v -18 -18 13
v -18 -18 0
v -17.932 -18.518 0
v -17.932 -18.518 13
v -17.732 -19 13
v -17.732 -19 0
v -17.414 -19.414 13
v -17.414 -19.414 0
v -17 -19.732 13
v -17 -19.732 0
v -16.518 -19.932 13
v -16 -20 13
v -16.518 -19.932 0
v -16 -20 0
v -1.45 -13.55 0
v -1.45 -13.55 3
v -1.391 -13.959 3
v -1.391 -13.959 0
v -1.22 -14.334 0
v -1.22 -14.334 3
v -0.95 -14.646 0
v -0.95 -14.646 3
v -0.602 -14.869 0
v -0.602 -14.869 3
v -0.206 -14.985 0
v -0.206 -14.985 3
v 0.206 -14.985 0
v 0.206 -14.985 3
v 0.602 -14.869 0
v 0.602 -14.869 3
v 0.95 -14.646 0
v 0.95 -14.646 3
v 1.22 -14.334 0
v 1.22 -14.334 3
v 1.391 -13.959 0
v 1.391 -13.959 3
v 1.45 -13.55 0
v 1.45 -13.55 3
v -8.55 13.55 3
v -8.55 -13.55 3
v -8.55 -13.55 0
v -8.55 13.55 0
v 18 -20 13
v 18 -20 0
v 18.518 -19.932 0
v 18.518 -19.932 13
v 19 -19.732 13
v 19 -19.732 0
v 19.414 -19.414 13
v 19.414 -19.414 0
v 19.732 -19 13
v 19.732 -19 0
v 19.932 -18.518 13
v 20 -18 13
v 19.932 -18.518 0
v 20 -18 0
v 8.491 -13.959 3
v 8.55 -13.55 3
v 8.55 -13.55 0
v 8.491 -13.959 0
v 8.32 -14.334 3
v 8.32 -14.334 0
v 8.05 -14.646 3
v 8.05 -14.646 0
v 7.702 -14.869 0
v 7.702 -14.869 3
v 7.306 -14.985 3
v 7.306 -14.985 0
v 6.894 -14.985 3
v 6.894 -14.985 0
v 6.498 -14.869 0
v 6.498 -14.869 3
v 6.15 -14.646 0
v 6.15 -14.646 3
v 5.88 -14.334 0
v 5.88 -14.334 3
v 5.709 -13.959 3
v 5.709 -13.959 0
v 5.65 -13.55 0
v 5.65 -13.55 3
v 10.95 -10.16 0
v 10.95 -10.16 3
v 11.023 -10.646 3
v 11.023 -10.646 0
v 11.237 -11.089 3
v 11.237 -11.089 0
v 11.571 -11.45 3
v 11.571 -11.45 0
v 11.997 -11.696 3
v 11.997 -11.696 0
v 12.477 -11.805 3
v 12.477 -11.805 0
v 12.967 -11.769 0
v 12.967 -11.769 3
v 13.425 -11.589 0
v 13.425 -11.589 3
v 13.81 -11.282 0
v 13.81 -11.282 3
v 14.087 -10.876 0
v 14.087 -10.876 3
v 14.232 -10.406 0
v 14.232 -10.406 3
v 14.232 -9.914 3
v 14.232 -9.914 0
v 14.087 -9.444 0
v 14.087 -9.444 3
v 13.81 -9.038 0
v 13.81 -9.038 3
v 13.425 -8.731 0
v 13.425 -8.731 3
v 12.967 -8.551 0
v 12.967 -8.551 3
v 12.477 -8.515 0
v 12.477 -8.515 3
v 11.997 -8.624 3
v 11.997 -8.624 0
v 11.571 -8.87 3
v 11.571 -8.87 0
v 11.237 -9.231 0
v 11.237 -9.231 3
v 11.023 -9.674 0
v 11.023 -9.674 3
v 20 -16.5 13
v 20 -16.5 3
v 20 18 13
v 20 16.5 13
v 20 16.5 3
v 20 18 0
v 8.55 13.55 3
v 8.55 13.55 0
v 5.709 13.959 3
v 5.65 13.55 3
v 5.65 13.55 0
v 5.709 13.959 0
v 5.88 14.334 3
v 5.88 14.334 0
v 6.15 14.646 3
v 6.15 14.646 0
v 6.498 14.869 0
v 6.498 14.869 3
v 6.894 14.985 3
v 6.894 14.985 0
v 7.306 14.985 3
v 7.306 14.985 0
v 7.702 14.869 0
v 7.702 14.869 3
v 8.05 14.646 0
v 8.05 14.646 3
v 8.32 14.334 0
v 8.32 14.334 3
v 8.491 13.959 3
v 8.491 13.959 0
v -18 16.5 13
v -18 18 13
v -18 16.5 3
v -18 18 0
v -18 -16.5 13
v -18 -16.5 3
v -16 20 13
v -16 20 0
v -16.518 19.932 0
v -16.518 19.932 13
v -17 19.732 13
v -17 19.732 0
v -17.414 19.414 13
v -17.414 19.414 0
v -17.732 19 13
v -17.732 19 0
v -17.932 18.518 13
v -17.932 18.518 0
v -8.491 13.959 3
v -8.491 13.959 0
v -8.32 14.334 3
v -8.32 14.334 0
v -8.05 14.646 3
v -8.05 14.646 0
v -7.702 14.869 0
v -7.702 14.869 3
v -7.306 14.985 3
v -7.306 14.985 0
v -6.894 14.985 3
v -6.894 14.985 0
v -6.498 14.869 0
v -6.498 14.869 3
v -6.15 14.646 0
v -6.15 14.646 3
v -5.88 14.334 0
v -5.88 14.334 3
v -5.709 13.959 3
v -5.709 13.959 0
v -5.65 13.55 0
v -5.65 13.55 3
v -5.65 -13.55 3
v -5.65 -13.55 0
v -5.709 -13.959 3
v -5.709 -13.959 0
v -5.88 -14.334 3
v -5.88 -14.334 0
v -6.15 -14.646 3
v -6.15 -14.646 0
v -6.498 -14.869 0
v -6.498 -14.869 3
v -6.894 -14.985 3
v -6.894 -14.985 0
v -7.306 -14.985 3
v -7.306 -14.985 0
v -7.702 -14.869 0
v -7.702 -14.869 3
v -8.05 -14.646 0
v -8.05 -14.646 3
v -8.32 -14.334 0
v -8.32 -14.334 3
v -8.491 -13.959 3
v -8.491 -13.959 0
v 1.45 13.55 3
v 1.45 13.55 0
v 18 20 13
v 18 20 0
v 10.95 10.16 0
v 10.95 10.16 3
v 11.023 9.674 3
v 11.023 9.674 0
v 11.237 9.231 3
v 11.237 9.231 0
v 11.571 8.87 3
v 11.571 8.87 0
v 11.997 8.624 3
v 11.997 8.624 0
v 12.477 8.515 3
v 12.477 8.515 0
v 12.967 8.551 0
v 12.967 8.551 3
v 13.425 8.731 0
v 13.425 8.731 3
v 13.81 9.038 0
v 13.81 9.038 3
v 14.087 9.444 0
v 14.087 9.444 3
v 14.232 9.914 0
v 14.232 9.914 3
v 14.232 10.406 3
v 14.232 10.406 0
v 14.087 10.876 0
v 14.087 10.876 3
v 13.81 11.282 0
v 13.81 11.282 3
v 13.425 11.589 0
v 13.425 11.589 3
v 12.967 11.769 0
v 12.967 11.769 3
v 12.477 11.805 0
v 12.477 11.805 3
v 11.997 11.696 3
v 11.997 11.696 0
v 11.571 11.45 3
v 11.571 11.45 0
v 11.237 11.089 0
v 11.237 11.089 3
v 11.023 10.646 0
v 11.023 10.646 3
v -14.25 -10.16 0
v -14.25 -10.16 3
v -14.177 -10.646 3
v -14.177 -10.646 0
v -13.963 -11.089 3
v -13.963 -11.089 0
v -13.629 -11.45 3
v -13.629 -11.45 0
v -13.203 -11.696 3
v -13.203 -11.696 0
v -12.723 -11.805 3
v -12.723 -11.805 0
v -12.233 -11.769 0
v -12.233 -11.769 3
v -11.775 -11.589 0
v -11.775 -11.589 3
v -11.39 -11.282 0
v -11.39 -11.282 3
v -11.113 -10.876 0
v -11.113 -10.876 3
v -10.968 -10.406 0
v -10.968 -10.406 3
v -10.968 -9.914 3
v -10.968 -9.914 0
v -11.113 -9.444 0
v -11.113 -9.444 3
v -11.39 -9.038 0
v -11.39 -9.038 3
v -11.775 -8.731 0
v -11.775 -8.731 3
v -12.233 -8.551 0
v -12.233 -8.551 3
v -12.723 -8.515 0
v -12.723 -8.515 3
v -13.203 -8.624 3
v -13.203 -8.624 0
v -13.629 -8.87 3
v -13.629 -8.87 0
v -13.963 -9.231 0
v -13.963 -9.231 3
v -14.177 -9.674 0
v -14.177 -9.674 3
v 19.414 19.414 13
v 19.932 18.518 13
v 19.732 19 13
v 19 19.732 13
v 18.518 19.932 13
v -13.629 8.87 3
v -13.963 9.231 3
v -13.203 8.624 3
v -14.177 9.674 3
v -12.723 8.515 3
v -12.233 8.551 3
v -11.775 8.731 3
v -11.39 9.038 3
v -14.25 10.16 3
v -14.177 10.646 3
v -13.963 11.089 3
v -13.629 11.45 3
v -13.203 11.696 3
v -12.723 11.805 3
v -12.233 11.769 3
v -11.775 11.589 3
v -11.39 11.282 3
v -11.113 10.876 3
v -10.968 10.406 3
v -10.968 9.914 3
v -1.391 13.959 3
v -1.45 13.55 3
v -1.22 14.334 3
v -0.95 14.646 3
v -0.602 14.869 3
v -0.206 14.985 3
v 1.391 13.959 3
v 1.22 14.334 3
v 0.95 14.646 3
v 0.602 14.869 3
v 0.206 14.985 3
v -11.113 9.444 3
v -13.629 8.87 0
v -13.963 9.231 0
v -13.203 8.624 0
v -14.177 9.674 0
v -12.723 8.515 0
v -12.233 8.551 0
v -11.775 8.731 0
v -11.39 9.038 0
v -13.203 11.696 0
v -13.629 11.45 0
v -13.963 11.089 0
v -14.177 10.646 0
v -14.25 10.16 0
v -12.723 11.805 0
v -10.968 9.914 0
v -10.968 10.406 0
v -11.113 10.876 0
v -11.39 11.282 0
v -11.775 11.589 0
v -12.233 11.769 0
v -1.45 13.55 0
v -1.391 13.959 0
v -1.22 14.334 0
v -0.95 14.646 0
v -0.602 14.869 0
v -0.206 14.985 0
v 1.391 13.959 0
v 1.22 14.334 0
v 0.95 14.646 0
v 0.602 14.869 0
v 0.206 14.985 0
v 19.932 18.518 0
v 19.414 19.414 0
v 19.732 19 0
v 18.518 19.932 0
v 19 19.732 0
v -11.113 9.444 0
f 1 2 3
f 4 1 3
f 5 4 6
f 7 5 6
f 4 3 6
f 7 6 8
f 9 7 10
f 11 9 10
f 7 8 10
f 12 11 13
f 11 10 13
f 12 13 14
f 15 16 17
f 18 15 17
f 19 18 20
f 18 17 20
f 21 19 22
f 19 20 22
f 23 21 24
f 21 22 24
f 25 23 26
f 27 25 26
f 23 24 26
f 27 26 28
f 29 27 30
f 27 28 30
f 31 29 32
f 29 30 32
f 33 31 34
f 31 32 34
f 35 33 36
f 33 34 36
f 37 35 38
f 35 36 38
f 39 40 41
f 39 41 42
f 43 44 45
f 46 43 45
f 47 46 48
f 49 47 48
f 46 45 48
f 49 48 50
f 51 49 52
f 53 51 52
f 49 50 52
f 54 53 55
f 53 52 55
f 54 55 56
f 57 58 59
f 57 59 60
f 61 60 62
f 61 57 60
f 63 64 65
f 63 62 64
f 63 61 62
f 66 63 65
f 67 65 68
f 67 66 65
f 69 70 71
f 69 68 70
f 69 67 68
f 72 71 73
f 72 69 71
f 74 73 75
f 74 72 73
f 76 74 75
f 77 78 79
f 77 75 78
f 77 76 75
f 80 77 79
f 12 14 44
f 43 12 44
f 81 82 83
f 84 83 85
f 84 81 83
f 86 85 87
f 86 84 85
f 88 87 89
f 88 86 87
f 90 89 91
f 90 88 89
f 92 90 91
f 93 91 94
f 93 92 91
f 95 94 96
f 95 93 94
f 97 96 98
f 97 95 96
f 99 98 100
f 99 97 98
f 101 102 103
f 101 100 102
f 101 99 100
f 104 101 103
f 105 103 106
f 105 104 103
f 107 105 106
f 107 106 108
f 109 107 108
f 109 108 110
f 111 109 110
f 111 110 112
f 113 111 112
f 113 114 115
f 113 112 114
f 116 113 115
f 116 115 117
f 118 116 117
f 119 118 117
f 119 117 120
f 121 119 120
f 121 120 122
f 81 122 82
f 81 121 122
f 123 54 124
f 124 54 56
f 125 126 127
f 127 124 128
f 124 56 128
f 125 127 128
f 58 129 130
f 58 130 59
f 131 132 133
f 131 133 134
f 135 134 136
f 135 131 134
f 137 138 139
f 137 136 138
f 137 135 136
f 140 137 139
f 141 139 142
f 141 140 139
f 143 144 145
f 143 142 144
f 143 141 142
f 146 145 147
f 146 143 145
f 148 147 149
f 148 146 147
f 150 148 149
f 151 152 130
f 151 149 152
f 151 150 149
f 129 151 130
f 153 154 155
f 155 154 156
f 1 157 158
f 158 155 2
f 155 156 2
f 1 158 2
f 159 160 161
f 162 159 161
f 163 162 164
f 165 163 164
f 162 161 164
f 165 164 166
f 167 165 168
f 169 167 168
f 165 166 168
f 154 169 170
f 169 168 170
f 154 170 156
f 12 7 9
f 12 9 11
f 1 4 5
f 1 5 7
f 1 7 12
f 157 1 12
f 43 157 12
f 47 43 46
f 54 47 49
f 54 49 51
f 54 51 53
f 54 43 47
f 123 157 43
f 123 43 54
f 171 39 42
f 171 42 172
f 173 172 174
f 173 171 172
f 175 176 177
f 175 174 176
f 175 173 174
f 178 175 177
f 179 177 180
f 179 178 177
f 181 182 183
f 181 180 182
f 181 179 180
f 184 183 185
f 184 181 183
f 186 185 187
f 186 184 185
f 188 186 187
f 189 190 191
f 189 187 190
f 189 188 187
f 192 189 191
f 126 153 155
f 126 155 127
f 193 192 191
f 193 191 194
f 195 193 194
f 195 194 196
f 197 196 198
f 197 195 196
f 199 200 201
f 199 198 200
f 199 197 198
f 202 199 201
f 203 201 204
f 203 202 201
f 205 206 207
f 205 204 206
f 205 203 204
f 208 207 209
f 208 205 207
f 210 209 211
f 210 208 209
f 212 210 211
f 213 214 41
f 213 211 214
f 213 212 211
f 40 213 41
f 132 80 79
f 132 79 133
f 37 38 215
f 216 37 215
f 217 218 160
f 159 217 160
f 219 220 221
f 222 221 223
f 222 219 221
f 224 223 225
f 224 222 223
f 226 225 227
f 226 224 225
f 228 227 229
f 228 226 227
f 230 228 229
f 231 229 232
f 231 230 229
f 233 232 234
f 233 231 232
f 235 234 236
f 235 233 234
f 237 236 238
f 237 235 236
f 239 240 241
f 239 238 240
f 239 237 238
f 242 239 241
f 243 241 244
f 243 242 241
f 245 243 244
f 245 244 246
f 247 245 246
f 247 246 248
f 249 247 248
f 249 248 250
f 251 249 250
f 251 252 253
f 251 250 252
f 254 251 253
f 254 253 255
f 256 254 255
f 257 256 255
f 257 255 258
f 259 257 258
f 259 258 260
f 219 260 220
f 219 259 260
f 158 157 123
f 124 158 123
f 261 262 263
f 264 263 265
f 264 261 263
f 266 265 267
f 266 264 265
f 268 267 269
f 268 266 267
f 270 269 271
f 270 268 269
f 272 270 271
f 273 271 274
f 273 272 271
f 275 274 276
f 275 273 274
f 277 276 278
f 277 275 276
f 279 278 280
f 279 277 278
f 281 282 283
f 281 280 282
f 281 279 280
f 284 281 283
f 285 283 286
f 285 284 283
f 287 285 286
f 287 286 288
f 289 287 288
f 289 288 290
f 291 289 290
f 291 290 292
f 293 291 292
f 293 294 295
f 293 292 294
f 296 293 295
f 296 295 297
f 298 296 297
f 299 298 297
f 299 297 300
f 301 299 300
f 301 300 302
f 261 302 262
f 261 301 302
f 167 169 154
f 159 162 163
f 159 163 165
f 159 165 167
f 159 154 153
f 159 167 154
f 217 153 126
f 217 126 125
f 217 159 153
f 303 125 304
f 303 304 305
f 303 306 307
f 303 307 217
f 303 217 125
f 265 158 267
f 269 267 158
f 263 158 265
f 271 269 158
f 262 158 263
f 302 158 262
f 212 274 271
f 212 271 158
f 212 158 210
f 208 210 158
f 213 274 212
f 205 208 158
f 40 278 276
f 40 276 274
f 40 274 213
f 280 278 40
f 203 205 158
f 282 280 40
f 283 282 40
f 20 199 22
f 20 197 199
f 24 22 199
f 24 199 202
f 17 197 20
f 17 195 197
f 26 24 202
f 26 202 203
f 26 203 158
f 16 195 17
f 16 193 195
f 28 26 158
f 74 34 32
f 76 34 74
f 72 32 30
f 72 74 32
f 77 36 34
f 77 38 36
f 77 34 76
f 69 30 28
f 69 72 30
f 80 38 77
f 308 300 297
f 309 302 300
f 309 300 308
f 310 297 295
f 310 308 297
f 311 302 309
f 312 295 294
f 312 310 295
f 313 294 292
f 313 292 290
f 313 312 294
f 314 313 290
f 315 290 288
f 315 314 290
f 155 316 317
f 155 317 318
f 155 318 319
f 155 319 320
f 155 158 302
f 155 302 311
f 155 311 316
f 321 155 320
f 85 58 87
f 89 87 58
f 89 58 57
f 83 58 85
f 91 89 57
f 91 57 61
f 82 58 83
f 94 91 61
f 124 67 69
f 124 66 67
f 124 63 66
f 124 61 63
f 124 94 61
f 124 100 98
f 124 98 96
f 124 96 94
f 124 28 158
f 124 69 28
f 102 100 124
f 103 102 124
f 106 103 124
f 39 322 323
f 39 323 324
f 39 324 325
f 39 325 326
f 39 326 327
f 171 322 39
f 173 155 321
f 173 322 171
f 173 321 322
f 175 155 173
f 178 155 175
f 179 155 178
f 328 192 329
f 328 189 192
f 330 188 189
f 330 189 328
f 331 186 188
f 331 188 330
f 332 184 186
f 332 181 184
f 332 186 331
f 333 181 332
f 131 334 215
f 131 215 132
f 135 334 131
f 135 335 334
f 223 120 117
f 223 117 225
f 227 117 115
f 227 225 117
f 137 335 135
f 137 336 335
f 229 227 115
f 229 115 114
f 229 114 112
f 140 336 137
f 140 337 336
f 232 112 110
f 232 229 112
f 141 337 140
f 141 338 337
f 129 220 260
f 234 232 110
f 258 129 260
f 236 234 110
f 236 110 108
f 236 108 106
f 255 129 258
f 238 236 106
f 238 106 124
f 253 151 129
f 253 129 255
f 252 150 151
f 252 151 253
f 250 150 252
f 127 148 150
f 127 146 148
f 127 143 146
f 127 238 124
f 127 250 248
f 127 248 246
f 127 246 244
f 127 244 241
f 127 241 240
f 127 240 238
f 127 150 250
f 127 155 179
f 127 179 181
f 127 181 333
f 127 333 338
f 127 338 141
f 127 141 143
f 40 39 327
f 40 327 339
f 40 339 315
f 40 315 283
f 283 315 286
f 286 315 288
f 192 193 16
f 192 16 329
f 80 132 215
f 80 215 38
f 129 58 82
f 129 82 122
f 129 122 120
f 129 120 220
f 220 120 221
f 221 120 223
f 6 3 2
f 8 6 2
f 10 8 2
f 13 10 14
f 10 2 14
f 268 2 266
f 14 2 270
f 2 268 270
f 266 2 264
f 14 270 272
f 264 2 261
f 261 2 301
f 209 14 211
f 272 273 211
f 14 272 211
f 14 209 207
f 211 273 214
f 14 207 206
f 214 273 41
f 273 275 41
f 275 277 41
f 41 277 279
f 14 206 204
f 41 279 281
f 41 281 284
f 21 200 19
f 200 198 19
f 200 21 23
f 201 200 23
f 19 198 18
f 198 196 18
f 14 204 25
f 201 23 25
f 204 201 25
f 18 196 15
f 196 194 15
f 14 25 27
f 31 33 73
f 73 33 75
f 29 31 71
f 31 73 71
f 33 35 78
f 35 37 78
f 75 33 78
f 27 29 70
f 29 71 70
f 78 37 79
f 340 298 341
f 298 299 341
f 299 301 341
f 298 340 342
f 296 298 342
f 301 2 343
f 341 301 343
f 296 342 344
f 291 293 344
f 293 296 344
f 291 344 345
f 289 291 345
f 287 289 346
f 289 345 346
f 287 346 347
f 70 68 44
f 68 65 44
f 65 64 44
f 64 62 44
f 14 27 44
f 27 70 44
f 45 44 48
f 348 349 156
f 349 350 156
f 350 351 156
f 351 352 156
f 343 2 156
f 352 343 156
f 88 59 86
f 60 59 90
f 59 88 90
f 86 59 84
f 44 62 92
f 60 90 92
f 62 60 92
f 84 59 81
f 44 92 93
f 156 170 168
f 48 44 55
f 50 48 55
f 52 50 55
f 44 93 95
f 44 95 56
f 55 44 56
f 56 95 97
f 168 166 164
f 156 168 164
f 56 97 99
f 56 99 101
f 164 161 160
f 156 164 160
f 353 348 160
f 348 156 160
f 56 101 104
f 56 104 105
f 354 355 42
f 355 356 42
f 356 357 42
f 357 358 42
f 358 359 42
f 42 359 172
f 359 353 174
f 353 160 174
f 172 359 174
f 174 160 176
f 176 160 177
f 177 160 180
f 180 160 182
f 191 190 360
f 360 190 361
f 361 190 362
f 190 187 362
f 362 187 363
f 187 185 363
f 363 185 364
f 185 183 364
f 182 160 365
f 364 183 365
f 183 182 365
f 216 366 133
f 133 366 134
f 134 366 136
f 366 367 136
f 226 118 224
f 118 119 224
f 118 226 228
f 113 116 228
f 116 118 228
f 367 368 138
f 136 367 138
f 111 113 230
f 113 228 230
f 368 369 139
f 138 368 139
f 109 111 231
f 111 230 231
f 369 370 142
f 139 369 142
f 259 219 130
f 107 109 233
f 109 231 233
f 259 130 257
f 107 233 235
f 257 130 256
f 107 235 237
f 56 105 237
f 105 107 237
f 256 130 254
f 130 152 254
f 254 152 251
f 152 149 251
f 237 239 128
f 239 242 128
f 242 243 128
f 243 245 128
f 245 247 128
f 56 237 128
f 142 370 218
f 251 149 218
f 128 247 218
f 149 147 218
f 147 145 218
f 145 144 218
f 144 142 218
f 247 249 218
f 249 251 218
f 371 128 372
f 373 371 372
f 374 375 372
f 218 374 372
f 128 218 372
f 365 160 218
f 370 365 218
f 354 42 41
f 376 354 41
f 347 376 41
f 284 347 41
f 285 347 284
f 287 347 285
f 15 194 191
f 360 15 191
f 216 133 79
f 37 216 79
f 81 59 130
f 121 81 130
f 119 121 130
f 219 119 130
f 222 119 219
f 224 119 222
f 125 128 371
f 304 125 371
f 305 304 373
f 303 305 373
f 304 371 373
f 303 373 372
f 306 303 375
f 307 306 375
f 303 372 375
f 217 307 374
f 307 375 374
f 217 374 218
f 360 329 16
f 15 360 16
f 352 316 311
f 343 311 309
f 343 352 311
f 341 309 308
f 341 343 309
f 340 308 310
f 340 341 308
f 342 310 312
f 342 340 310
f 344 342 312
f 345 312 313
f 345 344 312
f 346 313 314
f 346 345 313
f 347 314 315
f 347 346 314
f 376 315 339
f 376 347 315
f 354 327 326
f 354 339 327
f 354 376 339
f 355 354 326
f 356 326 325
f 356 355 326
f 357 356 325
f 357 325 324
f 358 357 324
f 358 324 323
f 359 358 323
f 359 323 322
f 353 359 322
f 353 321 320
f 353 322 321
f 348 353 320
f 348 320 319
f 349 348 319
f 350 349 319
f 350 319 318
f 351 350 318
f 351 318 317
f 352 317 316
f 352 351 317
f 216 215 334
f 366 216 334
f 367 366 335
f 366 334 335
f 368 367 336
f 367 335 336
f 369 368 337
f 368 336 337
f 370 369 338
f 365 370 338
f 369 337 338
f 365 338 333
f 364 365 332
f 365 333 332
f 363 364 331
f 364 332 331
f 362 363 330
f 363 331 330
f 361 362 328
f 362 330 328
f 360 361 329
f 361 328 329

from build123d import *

# Parameters (mm, degrees)
SKETCH1_R           = 1.65
BOSS_EXTRUDE1_DEPTH = 13
CUT_EXTRUDE1_DEPTH  = 32.128764833
SKETCH3_W           = 52.718311268
SKETCH3_H           = 33
CUT_EXTRUDE2_DEPTH  = 10


with BuildPart() as part:
    # Sketch1 → Boss-Extrude1 (new body)
    with BuildSketch(Plane.XY):
        with BuildLine():
            Line((0, 20), (-16, 20))
            ThreePointArc((-16, 20), (-17.414213562, 19.414213562), (-18, 18))
            Line((-18, 18), (-18, -18))
            ThreePointArc((-18, -18), (-17.414213562, -19.414213562), (-16, -20))
            Line((-16, -20), (0, -20))
            Line((0, -20), (18, -20))
            ThreePointArc((18, -20), (19.414213562, -19.414213562), (20, -18))
            Line((20, -18), (20, 18))
            ThreePointArc((20, 18), (19.414213562, 19.414213562), (18, 20))
            Line((18, 20), (0, 20))
        make_face()
        with Locations(Location((-12.6, 10.16, 0), (0, 0, 180))):
            Circle(SKETCH1_R, mode=Mode.SUBTRACT)
        with Locations(Location((12.6, 10.16, 0), (0, 0, 180))):
            Circle(SKETCH1_R, mode=Mode.SUBTRACT)
        with Locations(Location((12.6, -10.16, 0), (0, 0, 180))):
            Circle(SKETCH1_R, mode=Mode.SUBTRACT)
        with Locations(Location((-12.6, -10.16, 0), (0, 0, 180))):
            Circle(SKETCH1_R, mode=Mode.SUBTRACT)
    extrude(amount=BOSS_EXTRUDE1_DEPTH)

    # Sketch2 → Cut-Extrude1 (cut, through all)
    with BuildSketch(Plane.XY.offset(13)):
        with BuildLine():
            Line((5.65, -13.55), (5.65, 13.55))
            ThreePointArc((5.65, 13.55), (7.1, 15), (8.55, 13.55))
            Line((8.55, 13.55), (8.55, -13.55))
            ThreePointArc((8.55, -13.55), (7.1, -15), (5.65, -13.55))
        make_face()
        with BuildLine():
            Line((1.45, -13.55), (1.45, 13.55))
            ThreePointArc((1.45, 13.55), (0, 15), (-1.45, 13.55))
            Line((-1.45, 13.55), (-1.45, -13.55))
            ThreePointArc((-1.45, -13.55), (0, -15), (1.45, -13.55))
        make_face()
        with BuildLine():
            Line((-8.55, -13.55), (-8.55, 13.55))
            ThreePointArc((-8.55, 13.55), (-7.1, 15), (-5.65, 13.55))
            Line((-5.65, 13.55), (-5.65, -13.55))
            ThreePointArc((-5.65, -13.55), (-7.1, -15), (-8.55, -13.55))
        make_face()
    extrude(amount=-CUT_EXTRUDE1_DEPTH, mode=Mode.SUBTRACT)

    # Sketch3 → Cut-Extrude2 (cut)
    with BuildSketch(Plane.XY.offset(13)):
        Rectangle(SKETCH3_W, SKETCH3_H)
    extrude(amount=-CUT_EXTRUDE2_DEPTH, mode=Mode.SUBTRACT)


solid = part.part
